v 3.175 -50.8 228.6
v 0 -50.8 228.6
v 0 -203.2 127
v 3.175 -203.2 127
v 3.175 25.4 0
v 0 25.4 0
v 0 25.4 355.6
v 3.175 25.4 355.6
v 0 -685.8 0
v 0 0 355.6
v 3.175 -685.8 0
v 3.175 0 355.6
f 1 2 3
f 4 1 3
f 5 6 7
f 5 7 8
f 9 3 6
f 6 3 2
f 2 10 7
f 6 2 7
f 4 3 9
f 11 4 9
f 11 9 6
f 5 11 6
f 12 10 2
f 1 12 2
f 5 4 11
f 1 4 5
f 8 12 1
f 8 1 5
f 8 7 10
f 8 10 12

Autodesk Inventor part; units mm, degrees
ref_plane "YZ Plane" through (0, 0, 0) normal (1, 0, 0) x (0, 1, 0)
ref_plane "XZ Plane" through (0, 0, 0) normal (0, 1, 0) x (-1, 0, 0)
ref_plane "XY Plane" through (0, 0, 0) normal (0, 0, 1) x (1, 0, 0)
sketch "Sketch1" plane through (0, 0, 0) normal (1, 0, 0) x (0, 1, 0)
  line L0 (0, 0) -> (0, 355.6)
  line L1 (0, 355.6) -> (-50.8, 228.6)
  line L2 (-50.8, 228.6) -> (-203.2, 127)
  line L3 (-203.2, 127) -> (-685.8, 0)
  line L4 (-685.8, 0) -> (0, 0)
  dimension "d0" = 355.6
  dimension "d1" = 127
  dimension "d2" = 50.8
  dimension "d3" = 203.2
  dimension "d4" = 127
  dimension "d5" = 685.8
extrude "Extrusion1" add sketch "Sketch1" along normal blind 3.175
sketch "Sketch2" plane through (0, 0, 355.6) normal (0, 1, 0) x (1, 0, 0)
  line L0 (0, 355.6) -> (0, 0) projected
  line L1 (0, 0) -> (3.175, 0) projected
  line L2 (3.175, 355.6) -> (3.175, 0) projected
  line L3 (0, 355.6) -> (3.175, 355.6) projected
extrude "Extrusion2" add sketch "Sketch2" along normal blind 25.4
properties part number "15102898-16-P-0102" material "ABS Plastic"
